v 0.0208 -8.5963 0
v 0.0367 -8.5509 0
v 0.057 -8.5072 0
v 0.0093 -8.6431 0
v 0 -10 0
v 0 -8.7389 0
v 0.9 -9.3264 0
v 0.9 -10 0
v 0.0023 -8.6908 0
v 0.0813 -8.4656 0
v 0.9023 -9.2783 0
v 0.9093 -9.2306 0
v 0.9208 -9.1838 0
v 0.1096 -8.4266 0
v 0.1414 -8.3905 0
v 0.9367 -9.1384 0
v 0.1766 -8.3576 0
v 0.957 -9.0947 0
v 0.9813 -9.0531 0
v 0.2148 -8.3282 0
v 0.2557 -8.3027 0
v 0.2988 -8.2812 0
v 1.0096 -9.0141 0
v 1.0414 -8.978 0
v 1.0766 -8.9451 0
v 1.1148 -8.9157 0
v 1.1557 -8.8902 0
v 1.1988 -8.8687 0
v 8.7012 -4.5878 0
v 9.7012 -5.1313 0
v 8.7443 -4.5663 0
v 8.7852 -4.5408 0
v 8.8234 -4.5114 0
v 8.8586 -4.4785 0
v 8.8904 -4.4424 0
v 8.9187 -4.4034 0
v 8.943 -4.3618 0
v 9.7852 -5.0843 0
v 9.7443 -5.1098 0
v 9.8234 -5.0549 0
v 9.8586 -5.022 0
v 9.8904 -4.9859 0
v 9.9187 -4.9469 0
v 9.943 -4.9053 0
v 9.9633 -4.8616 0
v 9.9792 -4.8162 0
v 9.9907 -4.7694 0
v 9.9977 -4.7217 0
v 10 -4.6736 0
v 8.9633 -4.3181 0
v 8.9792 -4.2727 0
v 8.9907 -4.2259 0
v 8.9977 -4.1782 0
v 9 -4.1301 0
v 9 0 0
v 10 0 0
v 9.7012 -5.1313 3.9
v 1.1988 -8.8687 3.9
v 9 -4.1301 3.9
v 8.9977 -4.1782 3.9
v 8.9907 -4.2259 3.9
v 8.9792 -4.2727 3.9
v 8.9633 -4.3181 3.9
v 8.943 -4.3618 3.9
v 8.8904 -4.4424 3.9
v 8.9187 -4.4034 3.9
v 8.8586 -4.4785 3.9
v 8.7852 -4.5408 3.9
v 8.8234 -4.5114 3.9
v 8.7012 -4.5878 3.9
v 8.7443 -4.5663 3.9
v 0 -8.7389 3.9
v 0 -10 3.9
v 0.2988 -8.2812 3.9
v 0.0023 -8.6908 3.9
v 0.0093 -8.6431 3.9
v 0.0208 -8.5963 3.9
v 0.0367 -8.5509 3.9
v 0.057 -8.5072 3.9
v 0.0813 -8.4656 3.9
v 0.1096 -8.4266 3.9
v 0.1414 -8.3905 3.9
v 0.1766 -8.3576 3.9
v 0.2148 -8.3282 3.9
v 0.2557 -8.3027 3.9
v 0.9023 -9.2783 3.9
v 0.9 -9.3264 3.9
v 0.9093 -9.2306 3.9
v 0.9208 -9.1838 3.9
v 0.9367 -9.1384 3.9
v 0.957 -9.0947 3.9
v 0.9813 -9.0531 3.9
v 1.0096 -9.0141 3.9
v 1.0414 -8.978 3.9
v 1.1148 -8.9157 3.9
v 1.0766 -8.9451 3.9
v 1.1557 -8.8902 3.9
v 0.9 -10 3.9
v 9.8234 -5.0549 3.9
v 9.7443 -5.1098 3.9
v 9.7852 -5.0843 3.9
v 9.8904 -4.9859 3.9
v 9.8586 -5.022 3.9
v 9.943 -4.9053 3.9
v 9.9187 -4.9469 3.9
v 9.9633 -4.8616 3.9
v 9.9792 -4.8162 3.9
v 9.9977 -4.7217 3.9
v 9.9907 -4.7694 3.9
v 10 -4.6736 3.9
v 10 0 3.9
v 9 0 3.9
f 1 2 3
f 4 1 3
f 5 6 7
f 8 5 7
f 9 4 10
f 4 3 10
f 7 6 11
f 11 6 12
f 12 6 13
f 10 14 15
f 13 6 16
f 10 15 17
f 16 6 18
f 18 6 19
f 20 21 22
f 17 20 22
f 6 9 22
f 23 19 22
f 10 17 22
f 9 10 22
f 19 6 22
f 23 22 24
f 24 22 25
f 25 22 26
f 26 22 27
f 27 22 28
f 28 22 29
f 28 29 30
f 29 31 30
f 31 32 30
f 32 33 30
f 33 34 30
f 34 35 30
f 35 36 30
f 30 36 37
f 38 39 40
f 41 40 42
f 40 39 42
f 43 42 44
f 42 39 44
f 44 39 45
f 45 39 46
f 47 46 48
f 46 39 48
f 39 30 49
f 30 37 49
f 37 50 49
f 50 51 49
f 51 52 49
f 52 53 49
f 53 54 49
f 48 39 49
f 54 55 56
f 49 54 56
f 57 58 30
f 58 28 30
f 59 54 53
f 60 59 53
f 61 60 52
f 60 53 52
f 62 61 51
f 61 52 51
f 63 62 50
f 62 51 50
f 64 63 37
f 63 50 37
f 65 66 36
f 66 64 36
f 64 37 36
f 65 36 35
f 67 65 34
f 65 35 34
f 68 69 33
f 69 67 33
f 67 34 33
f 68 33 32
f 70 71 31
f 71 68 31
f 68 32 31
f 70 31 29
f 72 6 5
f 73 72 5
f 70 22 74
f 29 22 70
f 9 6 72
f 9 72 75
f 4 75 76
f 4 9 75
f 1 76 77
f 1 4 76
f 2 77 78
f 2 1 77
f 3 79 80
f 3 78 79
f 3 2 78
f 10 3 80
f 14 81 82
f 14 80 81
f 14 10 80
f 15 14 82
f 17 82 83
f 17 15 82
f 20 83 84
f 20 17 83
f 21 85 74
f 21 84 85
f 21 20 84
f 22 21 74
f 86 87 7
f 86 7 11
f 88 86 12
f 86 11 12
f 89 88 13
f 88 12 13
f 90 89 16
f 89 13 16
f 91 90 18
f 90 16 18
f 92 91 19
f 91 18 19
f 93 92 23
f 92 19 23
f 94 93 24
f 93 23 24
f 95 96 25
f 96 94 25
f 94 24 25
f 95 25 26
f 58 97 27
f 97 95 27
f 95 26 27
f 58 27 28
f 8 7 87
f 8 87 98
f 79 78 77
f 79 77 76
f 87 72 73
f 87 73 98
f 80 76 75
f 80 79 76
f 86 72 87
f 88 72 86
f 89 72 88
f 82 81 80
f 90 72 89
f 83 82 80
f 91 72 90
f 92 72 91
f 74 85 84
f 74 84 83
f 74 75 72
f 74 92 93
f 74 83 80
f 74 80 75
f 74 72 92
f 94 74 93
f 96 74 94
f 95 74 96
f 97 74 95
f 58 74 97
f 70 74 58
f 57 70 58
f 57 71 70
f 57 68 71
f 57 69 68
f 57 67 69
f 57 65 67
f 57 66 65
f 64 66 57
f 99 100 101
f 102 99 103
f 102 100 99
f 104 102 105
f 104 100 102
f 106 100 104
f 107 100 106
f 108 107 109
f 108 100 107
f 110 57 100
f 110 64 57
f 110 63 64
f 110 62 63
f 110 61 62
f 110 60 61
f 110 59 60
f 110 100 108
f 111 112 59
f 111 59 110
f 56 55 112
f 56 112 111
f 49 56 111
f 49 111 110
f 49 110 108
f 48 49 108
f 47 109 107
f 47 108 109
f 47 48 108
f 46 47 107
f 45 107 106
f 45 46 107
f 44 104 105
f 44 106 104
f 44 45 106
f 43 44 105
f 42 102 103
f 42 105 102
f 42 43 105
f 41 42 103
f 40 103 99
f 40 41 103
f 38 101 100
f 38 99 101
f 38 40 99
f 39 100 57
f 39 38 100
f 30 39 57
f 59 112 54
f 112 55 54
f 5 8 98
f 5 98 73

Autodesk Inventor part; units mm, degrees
ref_plane "YZ Plane" through (0, 0, 0) normal (1, 0, 0) x (0, 1, 0)
ref_plane "XZ Plane" through (0, 0, 0) normal (0, 1, 0) x (-1, 0, 0)
ref_plane "XY Plane" through (0, 0, 0) normal (0, 0, 1) x (1, 0, 0)
sketch "Sketch1" plane through (0, 0, 0) normal (0, 0, 1) x (1, 0, 0)
  line L0 (9, 0) -> (10, 0)
  line L1 (13, 0) -> (13, -10)
  line L2 (0, -13.9226) -> (0, -8.7389) construction
  line L3 (0.9, -13.9226) -> (0.9, -9.3264) construction
  line L4 (-0.7394, -10) -> (2.996, -10) construction
  line L5 (-0.7394, -9) -> (2.996, -9) construction
  line L6 (-0.7394, -5) -> (10, -5) construction
  line L7 (1.1988, -8.8687) -> (9.7012, -5.1313)
  line L8 (0.2988, -8.2812) -> (8.7012, -4.5878)
  arc A0 (0.2988, -8.2812) -> (0, -8.7389) centre (0.5, -8.7389) ccw
  arc A1 (1.1988, -8.8687) -> (0.9, -9.3264) centre (1.4, -9.3264) ccw
  line L9 (0.9, -9.3264) -> (0.9, -10)
  line L10 (0.9, -10) -> (0, -10)
  line L11 (10, 0) -> (10, -4.6736)
  line L12 (10, -13.9226) -> (10, -10) construction
  line L13 (10, -5) -> (10, 0) construction
  line L14 (9, 0) -> (9, -4.1301)
  line L15 (0, -8.7389) -> (0, -10)
  arc A2 (8.7012, -4.5878) -> (9, -4.1301) centre (8.5, -4.1301) ccw
  arc A3 (9.7012, -5.1313) -> (10, -4.6736) centre (9.5, -4.6736) ccw
  point P0 (0, 0)
  point P1 (0, -6.4341)
  point P2 (0.9, -9)
  dimension "d0" = 13
  dimension "d1" = 10
  dimension "d2" = 0.9
  dimension "d3" = 1
  dimension "d5" = 4
  dimension "d6" = 0.9
  dimension "d7" = 0.5
  dimension "d8" = 1
  dimension "d9" = 0.5
extrude "Extrusion1" add sketch "Sketch1" along normal blind 3.9
properties part number "Limit switch sheet" material "Silver"
